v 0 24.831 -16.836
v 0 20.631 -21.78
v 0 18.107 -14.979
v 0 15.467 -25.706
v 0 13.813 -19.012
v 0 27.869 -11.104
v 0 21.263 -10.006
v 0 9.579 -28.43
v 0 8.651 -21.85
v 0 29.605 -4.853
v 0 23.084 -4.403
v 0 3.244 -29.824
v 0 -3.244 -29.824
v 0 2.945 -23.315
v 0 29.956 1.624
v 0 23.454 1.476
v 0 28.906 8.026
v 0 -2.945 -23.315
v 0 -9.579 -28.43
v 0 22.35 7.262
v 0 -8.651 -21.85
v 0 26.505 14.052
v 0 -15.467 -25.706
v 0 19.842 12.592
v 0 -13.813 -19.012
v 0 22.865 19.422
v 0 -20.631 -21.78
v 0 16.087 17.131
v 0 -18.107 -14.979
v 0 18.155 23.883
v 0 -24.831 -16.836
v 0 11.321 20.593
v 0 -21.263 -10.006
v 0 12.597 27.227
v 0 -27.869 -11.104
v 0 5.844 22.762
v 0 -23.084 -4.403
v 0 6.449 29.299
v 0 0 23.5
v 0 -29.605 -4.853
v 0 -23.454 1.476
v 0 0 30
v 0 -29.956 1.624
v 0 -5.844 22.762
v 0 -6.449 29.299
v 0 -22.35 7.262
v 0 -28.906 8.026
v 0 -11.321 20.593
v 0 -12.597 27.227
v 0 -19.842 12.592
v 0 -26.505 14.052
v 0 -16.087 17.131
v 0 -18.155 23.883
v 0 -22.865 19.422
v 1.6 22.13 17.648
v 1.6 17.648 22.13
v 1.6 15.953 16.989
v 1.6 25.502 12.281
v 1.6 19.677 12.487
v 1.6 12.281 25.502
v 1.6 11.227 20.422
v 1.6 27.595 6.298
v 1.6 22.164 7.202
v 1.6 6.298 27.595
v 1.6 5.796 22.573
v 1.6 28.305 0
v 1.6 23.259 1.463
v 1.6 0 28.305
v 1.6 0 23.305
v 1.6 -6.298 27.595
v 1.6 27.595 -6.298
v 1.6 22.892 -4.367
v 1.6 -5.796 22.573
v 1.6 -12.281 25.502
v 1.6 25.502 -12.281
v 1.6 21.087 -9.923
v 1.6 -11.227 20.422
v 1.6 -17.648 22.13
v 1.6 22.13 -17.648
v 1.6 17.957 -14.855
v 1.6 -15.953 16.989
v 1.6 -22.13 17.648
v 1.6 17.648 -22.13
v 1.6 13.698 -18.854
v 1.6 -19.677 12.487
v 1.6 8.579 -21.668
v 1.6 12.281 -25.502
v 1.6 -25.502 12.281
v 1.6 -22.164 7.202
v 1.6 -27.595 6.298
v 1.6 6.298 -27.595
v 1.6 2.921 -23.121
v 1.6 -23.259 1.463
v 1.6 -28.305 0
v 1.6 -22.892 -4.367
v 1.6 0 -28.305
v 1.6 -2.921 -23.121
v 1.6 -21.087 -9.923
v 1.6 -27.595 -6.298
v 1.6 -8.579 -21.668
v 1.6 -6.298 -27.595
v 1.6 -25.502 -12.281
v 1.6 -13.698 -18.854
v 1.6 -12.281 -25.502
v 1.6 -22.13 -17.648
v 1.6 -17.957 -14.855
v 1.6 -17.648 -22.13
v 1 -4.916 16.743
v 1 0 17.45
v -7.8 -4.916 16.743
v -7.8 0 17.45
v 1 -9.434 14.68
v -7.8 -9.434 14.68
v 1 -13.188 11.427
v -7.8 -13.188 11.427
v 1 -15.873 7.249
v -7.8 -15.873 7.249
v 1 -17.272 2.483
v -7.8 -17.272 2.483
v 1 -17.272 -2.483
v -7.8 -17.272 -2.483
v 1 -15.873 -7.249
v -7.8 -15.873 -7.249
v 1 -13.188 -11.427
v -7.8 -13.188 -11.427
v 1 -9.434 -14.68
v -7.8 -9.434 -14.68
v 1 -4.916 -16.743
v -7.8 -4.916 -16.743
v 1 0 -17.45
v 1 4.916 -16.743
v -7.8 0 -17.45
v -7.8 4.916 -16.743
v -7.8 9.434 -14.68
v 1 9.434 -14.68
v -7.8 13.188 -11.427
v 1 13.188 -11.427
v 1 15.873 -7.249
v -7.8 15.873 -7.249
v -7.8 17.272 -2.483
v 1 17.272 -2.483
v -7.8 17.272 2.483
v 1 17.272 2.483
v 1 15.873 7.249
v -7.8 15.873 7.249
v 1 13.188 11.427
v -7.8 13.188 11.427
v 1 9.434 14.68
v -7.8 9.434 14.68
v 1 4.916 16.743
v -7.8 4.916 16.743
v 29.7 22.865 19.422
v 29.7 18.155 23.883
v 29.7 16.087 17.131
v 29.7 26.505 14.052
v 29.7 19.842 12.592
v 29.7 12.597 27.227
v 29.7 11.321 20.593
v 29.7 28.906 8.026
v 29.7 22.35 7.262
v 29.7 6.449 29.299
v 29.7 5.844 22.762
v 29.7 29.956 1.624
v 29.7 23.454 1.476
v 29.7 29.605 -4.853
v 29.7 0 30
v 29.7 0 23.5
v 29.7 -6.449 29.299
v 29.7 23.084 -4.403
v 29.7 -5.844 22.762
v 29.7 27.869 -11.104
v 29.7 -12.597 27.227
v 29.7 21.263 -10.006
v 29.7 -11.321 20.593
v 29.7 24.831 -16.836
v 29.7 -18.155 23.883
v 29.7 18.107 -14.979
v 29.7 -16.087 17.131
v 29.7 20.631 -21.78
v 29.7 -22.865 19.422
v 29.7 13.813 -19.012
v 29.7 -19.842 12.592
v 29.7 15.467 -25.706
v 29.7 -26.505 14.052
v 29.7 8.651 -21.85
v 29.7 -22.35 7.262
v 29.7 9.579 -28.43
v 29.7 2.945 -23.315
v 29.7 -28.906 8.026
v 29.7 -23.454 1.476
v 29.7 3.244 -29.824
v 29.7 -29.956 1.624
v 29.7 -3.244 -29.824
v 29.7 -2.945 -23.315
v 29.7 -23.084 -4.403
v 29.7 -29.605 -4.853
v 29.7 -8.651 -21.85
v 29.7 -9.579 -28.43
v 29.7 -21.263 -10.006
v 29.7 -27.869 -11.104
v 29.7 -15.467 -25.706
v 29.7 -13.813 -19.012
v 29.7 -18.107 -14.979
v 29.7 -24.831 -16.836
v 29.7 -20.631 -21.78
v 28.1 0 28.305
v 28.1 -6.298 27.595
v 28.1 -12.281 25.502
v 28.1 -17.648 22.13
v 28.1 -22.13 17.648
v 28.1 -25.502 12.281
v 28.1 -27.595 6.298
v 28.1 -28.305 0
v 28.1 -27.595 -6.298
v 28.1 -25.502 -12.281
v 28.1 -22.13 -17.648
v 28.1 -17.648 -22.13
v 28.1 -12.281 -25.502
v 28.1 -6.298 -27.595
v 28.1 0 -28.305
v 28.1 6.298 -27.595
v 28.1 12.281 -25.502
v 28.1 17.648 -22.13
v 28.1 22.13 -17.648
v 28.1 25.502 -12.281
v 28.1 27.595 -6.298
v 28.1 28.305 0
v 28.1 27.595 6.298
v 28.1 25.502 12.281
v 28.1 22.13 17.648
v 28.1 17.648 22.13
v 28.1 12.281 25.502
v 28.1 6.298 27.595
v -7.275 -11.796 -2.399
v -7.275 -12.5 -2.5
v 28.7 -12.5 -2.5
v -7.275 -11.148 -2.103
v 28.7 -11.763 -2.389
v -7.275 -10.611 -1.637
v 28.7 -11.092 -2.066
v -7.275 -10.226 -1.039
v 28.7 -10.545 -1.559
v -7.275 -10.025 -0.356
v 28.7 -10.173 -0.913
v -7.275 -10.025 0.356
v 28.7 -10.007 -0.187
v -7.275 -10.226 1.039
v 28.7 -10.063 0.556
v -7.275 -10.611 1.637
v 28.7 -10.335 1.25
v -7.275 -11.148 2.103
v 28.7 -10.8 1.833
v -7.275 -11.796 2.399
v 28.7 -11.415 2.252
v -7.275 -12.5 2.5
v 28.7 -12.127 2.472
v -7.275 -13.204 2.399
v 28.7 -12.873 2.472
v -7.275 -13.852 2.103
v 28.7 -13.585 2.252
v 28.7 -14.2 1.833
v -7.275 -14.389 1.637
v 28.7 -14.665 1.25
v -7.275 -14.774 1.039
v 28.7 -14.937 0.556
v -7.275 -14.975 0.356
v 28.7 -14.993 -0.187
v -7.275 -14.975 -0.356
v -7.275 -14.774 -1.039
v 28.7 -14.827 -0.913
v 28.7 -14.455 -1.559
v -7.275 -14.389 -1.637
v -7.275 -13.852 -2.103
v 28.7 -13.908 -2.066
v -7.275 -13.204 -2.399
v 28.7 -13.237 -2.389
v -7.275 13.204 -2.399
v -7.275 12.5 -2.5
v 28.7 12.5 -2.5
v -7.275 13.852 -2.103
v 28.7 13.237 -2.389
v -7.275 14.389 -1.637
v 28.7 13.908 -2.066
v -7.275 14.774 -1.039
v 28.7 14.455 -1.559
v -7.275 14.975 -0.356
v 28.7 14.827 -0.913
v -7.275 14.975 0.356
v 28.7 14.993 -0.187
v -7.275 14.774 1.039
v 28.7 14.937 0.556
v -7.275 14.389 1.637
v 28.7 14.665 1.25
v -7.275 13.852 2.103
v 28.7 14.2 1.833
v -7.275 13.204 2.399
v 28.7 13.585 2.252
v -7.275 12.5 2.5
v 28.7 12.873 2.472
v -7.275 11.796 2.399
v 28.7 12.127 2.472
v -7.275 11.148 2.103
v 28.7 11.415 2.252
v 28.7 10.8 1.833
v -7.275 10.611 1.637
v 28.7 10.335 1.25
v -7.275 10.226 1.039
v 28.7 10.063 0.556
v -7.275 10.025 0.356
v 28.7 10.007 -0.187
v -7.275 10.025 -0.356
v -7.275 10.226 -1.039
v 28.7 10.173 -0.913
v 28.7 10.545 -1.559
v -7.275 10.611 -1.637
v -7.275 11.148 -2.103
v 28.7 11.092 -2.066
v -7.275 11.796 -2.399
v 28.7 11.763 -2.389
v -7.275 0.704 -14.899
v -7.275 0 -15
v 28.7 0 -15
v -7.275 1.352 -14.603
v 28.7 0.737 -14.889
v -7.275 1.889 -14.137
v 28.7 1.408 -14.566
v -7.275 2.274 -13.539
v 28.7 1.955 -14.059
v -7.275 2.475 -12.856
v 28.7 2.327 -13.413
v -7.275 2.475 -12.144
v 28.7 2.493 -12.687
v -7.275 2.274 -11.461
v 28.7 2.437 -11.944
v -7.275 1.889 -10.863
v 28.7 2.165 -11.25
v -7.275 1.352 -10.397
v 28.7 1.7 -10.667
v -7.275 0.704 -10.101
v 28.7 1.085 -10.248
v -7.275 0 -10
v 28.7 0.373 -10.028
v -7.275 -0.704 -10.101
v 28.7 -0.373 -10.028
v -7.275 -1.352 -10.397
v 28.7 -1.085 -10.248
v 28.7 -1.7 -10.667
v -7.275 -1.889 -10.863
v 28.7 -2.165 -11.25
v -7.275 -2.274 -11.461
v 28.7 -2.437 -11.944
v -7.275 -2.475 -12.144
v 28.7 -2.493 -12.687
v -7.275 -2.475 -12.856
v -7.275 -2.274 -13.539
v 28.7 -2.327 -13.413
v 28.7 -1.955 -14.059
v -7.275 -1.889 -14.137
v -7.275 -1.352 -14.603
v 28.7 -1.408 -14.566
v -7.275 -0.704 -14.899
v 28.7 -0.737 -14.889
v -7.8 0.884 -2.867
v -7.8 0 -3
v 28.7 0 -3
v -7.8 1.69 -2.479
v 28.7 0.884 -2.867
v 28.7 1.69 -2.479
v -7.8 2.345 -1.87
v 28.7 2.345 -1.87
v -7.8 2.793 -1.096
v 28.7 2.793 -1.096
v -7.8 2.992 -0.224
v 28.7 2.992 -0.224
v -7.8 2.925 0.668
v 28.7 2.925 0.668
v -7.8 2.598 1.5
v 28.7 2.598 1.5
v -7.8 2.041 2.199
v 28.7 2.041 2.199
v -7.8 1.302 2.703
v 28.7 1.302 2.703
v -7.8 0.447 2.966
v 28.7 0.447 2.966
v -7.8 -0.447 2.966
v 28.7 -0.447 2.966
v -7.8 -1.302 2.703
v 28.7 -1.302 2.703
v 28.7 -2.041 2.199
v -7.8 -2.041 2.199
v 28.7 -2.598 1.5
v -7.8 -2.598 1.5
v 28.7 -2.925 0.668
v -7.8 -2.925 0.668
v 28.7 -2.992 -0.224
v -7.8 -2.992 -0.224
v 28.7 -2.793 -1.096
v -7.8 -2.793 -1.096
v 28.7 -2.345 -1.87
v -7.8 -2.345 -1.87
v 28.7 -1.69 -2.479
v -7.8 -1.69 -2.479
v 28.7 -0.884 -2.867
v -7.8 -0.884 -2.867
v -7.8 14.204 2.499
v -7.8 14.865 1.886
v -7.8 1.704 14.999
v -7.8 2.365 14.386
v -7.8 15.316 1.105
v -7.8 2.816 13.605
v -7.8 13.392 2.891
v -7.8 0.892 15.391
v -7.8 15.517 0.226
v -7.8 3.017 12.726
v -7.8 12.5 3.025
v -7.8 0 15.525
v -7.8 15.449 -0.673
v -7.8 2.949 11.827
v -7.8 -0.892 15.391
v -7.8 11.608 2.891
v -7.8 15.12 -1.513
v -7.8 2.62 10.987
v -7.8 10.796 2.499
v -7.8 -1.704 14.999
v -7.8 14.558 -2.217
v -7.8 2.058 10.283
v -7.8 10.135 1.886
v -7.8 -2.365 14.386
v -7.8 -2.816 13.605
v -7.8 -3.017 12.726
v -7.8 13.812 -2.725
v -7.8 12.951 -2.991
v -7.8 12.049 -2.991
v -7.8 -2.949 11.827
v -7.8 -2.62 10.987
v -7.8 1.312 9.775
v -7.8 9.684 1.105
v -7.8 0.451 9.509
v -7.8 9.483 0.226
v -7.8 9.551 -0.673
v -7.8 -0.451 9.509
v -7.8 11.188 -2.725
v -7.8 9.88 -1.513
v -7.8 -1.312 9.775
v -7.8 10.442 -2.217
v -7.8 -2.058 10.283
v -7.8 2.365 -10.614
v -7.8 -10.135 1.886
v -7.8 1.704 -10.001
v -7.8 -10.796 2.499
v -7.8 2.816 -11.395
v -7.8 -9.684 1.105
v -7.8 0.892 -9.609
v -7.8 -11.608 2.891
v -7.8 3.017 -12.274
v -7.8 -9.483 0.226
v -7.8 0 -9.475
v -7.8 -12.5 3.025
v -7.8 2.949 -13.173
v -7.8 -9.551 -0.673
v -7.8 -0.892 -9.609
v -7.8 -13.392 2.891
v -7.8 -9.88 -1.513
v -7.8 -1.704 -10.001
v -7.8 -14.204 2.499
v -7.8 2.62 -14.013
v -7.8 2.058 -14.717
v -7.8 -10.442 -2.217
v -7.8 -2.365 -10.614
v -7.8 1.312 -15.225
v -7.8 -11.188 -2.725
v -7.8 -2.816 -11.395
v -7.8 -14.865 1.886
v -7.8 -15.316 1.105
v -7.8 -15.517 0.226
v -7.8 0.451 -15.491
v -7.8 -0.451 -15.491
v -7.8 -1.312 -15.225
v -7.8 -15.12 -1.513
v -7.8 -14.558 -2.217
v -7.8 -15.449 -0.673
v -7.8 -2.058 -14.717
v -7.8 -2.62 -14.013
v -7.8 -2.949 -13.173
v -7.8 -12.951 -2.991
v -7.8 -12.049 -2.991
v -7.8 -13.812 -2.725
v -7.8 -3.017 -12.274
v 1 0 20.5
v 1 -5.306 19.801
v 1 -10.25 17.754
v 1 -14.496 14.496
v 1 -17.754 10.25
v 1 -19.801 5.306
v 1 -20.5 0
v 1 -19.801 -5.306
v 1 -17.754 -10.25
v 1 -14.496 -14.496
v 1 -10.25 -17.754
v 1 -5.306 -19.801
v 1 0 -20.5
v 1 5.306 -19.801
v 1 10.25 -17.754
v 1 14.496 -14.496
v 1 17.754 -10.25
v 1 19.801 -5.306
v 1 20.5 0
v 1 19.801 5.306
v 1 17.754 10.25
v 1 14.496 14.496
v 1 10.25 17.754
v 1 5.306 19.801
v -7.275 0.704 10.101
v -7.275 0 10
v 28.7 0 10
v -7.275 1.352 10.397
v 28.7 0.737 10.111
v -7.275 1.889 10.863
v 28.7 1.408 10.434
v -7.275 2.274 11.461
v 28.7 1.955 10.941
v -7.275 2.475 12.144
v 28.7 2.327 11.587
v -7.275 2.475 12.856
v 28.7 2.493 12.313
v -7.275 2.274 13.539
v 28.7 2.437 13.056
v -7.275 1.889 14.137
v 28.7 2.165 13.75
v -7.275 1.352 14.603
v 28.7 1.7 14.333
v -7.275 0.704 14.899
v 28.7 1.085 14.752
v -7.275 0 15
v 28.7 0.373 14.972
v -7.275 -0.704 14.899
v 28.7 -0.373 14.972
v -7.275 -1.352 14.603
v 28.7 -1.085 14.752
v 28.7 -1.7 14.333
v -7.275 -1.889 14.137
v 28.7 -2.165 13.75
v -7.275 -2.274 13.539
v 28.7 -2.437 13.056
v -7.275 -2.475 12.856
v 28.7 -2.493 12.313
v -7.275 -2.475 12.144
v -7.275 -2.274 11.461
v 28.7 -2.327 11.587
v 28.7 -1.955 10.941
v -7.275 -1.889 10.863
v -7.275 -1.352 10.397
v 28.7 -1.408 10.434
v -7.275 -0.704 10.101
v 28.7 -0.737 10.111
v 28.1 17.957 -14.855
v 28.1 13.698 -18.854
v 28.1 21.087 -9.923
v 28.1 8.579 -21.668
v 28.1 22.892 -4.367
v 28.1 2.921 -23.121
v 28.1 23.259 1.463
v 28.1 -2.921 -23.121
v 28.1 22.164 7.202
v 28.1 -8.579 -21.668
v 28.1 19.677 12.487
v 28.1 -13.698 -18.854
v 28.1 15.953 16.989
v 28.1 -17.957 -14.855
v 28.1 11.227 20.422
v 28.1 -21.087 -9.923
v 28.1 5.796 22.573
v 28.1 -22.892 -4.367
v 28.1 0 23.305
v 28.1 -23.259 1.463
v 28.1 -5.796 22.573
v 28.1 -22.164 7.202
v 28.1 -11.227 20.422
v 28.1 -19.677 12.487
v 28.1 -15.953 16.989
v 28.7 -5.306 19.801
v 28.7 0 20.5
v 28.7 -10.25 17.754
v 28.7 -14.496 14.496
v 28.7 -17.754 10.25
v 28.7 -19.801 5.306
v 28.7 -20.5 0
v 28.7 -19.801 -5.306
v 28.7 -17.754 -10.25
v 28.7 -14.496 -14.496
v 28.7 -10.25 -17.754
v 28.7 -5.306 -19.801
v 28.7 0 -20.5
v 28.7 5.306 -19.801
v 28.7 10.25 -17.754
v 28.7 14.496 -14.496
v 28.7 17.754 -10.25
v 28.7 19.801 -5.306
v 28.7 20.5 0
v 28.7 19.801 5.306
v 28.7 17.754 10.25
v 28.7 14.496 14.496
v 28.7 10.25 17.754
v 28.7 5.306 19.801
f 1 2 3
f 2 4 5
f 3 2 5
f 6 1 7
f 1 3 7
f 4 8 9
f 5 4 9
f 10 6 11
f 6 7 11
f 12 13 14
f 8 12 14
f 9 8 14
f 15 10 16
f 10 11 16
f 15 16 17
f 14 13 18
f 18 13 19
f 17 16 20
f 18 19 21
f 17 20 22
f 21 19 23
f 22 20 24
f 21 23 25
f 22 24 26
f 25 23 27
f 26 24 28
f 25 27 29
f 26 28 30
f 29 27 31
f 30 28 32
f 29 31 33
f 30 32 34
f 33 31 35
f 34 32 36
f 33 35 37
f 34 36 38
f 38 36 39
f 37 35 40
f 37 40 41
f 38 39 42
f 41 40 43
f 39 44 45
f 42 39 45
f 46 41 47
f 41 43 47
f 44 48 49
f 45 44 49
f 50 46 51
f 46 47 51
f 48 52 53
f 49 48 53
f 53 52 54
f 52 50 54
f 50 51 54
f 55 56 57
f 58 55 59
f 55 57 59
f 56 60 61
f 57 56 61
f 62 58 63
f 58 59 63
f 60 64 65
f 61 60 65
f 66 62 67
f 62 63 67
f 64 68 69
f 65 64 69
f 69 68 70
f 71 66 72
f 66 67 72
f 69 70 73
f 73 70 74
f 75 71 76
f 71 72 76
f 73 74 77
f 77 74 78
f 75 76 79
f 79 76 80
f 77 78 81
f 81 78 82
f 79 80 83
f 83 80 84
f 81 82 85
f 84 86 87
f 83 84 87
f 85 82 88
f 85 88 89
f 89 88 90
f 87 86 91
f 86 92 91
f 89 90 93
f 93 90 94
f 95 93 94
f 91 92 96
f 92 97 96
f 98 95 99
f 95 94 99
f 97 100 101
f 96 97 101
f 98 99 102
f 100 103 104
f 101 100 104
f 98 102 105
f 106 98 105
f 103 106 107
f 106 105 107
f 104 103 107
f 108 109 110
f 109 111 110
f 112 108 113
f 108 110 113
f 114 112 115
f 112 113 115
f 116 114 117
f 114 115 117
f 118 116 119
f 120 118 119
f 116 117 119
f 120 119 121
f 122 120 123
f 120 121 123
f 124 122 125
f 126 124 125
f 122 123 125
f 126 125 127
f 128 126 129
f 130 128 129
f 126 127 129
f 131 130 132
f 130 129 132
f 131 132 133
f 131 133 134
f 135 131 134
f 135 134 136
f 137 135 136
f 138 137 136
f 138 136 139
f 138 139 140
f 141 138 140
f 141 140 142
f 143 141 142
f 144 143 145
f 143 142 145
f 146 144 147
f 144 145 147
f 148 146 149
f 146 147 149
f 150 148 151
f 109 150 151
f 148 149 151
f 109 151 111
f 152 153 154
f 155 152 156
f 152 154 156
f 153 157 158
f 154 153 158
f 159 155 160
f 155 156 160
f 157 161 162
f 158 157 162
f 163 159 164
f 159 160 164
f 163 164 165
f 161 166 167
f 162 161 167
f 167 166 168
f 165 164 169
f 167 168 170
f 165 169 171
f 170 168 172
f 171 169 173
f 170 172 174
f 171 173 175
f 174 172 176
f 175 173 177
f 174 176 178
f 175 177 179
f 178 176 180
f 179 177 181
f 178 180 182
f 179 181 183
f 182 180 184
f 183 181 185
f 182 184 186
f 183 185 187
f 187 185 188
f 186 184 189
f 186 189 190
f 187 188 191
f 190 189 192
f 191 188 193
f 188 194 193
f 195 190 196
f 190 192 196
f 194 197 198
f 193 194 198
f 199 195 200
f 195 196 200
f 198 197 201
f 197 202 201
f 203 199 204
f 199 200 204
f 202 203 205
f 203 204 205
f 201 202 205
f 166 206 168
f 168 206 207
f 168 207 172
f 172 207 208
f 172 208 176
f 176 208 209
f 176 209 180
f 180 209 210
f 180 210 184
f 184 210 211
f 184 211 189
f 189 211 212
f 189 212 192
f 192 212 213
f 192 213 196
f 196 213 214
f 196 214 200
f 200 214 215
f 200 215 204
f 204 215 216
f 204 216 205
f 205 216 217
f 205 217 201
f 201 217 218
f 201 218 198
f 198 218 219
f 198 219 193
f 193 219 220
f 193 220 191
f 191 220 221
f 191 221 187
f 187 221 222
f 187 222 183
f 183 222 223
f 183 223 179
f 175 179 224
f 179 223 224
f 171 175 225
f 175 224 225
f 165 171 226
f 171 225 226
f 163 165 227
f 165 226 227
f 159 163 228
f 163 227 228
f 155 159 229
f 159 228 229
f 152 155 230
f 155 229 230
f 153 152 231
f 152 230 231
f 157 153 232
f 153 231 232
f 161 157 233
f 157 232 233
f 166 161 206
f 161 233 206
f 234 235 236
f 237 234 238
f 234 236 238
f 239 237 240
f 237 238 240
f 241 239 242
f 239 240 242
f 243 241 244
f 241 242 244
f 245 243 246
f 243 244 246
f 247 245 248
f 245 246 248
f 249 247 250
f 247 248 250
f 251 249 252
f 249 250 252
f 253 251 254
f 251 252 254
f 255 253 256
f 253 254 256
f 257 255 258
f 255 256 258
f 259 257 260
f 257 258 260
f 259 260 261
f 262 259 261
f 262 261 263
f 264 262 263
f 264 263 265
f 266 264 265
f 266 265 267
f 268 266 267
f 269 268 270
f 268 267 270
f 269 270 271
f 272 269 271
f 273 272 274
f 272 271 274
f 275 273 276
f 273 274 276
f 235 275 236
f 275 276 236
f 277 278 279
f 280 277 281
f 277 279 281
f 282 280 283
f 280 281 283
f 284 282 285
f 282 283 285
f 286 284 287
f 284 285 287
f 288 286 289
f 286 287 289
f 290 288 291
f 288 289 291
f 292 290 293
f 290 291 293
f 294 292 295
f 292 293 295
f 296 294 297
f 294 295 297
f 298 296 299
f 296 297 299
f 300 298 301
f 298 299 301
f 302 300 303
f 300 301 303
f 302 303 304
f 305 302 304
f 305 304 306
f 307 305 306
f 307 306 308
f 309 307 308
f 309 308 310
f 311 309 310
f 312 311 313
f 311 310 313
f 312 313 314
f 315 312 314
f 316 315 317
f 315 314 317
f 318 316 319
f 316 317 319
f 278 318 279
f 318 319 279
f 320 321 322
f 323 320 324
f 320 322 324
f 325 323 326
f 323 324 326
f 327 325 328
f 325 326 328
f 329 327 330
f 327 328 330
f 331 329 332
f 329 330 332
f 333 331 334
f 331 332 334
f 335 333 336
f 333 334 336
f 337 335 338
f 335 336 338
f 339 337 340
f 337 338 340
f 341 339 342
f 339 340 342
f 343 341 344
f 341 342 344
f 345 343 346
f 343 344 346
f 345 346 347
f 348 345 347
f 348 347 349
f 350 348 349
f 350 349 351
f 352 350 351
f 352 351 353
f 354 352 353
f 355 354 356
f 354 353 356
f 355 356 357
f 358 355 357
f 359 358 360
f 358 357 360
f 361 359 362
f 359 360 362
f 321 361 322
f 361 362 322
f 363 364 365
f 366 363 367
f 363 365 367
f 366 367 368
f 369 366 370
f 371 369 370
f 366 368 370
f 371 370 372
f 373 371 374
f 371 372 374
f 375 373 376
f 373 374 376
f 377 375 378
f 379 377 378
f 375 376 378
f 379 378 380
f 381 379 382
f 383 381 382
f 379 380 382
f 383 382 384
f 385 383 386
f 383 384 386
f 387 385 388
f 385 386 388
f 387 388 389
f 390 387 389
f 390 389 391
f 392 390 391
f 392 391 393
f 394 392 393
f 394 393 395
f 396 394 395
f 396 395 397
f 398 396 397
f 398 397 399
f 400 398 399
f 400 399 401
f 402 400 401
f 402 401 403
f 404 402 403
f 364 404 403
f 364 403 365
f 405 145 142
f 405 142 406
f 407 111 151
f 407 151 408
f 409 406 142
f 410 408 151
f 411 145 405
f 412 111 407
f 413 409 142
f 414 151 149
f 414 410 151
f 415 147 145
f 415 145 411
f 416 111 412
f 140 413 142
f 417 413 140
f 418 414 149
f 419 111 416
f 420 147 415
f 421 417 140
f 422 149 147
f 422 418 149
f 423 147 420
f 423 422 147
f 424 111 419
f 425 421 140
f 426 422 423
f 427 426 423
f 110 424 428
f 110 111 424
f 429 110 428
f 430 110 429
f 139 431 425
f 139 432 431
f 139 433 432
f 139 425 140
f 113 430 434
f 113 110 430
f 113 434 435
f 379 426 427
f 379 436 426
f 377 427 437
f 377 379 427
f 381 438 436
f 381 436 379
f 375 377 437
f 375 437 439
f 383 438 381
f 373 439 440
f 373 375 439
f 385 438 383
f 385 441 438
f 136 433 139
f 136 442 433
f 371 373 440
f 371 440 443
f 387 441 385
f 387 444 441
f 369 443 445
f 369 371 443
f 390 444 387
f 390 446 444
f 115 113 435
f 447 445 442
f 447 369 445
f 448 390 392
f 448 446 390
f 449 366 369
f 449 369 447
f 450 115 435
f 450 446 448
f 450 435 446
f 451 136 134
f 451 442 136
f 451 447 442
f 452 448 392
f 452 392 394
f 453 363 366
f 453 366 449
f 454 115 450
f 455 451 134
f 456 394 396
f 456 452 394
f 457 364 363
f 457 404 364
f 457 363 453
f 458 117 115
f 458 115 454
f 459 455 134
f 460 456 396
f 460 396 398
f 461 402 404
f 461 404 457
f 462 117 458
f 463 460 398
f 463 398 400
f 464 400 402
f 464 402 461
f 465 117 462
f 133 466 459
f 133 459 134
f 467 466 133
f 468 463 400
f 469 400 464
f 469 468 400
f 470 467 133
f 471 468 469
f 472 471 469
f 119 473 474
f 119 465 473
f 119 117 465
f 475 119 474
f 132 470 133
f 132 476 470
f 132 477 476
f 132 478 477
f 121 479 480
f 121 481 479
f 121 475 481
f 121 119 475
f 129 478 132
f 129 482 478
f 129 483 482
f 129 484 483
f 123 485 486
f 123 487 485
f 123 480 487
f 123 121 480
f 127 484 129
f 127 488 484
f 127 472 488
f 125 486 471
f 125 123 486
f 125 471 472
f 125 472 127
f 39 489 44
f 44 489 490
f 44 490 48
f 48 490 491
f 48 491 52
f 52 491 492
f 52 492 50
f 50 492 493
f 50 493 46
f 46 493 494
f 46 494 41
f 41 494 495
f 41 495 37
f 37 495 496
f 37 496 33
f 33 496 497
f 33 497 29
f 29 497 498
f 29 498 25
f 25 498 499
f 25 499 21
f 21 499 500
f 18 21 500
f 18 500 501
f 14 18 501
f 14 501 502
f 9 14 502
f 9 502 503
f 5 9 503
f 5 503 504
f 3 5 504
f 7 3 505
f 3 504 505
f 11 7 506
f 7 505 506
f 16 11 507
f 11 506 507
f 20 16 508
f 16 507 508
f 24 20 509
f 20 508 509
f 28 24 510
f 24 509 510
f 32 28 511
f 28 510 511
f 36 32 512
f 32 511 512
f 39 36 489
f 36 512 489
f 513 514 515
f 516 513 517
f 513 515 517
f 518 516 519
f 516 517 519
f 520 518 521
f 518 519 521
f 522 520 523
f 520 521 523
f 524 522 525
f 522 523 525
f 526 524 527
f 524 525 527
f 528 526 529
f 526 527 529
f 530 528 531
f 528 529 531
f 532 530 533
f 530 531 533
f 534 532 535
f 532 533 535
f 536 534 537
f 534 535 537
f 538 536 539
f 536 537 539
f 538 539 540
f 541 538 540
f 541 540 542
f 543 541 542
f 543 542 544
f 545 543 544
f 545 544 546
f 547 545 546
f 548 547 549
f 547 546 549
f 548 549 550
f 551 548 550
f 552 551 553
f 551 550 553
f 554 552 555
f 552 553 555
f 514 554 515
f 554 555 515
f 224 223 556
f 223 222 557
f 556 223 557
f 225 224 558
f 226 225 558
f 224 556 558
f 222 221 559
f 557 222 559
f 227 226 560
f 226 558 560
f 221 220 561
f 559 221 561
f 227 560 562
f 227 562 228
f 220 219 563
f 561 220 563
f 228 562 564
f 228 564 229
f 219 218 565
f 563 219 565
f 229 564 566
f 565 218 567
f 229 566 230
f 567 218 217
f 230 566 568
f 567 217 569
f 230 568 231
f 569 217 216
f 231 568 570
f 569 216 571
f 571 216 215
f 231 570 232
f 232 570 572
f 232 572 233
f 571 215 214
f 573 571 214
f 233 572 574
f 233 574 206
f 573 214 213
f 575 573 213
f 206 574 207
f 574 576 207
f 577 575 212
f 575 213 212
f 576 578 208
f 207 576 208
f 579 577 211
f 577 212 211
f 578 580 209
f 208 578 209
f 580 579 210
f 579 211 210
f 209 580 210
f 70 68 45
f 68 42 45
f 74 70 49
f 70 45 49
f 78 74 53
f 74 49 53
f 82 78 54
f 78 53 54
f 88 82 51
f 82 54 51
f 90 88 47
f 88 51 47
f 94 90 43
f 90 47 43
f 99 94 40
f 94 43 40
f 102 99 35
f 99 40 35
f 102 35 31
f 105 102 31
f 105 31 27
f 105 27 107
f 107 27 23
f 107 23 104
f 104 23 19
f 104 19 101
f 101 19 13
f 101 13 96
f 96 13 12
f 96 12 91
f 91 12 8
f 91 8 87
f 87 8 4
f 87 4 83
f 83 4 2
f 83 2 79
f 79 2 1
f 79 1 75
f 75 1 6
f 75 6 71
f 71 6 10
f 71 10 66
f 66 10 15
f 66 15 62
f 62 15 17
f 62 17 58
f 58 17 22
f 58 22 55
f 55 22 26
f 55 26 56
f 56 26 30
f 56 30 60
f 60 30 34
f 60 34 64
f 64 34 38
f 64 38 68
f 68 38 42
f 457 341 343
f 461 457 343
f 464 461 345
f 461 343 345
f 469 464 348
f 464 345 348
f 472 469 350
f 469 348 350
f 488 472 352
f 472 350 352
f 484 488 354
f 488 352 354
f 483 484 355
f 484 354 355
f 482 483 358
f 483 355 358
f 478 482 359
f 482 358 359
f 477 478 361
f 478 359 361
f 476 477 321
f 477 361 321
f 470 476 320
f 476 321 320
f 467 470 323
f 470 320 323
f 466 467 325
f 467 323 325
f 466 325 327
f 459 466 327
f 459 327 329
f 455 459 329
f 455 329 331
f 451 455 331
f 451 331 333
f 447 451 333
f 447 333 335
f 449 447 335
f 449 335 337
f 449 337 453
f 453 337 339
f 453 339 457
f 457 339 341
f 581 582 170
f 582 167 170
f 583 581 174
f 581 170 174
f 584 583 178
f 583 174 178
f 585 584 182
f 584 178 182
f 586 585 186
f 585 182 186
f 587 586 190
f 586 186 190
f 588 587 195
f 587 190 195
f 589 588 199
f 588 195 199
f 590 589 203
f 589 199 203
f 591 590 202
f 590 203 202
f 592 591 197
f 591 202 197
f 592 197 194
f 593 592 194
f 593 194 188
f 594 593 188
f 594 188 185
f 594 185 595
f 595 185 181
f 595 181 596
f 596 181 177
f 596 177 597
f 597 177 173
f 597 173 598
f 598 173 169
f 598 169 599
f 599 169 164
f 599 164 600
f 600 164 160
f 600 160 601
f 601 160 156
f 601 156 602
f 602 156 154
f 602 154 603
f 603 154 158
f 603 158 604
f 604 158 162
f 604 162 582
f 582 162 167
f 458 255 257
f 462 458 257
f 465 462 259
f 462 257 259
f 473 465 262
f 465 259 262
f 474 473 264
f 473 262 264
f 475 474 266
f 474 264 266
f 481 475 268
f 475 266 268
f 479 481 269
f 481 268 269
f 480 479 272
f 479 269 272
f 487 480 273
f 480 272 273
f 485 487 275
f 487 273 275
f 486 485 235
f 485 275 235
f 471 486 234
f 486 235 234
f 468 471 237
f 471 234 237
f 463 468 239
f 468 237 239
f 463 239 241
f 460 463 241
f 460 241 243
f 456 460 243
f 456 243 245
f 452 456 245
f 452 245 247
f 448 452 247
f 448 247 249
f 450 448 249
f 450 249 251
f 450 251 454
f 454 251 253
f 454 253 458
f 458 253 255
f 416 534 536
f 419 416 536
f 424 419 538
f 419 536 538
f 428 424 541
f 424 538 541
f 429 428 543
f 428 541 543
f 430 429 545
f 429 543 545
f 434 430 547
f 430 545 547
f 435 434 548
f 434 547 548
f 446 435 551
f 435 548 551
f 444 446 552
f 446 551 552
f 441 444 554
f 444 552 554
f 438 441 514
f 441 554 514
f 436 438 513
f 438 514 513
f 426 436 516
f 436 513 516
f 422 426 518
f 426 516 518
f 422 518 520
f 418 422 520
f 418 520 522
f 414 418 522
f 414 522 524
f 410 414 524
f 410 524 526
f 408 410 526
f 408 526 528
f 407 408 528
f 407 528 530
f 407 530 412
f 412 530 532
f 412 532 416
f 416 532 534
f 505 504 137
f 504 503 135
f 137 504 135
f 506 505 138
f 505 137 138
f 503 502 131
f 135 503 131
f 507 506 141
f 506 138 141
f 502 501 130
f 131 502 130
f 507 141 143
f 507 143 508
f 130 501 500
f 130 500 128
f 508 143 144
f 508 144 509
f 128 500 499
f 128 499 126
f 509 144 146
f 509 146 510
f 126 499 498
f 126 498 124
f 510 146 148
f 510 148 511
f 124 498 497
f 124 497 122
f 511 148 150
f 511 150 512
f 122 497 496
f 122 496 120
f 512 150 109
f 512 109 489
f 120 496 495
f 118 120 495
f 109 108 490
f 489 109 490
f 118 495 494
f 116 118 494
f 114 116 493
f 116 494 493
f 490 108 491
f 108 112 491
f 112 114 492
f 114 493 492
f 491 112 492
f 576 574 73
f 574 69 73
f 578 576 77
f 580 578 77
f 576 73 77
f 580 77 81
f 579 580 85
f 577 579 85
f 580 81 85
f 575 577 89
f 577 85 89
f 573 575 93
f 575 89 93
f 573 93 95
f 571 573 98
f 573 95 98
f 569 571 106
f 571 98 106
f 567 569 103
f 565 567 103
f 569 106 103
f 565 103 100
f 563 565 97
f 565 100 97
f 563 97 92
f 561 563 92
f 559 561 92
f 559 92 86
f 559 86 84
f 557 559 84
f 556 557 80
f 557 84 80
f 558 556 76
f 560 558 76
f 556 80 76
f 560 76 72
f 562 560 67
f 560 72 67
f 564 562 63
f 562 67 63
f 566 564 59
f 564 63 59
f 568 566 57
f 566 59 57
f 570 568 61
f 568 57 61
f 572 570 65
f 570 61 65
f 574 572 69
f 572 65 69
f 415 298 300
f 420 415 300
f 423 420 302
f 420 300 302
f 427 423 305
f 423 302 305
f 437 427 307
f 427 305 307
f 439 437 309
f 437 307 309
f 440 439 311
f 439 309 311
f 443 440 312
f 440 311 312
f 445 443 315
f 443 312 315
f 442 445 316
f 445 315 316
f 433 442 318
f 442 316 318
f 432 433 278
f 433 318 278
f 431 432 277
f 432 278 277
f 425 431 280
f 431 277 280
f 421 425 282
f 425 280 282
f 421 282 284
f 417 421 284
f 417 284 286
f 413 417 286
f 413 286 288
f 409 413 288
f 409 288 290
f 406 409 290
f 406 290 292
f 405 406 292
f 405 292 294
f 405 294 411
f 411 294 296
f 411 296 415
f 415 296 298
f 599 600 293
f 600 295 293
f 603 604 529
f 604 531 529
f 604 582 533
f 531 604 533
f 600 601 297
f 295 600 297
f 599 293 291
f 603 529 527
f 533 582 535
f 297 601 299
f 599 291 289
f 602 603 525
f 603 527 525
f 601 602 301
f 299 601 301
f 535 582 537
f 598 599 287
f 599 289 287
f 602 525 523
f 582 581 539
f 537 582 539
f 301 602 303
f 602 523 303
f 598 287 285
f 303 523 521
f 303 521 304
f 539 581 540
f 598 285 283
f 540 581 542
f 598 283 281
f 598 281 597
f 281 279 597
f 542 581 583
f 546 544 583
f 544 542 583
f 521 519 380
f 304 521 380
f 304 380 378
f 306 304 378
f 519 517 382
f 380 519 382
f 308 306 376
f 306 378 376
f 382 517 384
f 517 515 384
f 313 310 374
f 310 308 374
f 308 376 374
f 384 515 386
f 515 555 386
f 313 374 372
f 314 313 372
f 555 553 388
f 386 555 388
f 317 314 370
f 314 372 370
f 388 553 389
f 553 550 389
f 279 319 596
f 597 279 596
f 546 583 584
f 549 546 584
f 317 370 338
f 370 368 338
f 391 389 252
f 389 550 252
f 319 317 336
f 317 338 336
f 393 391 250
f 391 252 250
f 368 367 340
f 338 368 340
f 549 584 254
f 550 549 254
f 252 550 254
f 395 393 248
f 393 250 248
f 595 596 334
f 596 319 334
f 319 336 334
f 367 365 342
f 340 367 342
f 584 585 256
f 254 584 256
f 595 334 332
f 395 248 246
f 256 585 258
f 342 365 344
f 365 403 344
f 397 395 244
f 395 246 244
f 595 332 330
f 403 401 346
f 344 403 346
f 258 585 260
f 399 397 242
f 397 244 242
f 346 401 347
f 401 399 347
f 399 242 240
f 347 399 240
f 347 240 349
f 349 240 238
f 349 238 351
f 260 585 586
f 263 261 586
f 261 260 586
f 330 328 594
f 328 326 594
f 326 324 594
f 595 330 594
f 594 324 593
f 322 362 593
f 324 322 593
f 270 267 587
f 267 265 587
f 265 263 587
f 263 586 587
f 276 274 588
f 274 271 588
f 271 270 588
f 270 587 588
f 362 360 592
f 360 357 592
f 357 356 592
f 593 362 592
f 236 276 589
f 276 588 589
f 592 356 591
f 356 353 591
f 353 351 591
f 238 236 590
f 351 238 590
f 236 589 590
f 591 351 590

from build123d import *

# Parameters (mm, degrees)
SKETCH1_W                   = 7.8
SKETCH1_H                   = 17.45
SKETCH2_R                   = 2.5
CUT_EXTRUDE1_DEPTH          = 57.623758265
M6_TAPPED_HOLE2_D           = 5
M6_TAPPED_HOLE2_DEPTH       = 55
M6_TAPPED_HOLE2_CSINK_D     = 6.05
M6_TAPPED_HOLE2_CSINK_ANGLE = 90
M6_TAPPED_HOLE2_TIP         = 1.502151548
SKETCH5_R                   = 3
CUT_EXTRUDE2_DEPTH          = 56.966507842


with BuildPart() as part:
    # Sketch1 → Revolve1 (revolve)
    with BuildSketch(Plane.XY, mode=Mode.PRIVATE) as revolve1_sk:
        Polygon((28.1, 23.305), (1.6, 23.305), (0.065, 23.305), (1, 20.5), (1, 17.45), (0, 17.45), (0, 0), (28.7, 0), (28.7, 20.5), (29.7, 23.5), (29.7, 30), (28.1, 28.305), align=None)
        Polygon((0.065, 23.305), (1.6, 23.305), (1.6, 28.305), (0, 30), (0, 23.5), align=None)
        with Locations((-3.9, 8.725)):
            Rectangle(SKETCH1_W, SKETCH1_H)
    revolve(revolve1_sk.sketch.rotate(Axis((0, 0, 0), (1, 0, 0)), 90), axis=Axis((0, 0, 0), (1, 0, 0)))

    # Sketch2 → Cut-Extrude1 (cut, through all)
    with BuildSketch(Plane(origin=(29.7, 0, 0), x_dir=(0, 0, -1), z_dir=(1, 0, 0))):
        with Locations((12.5, 0)):
            Circle(SKETCH2_R)
        with Locations((0, -12.5)):
            Circle(SKETCH2_R)
        with Locations((-12.5, 0)):
            Circle(SKETCH2_R)
        with Locations((0, 12.5)):
            Circle(SKETCH2_R)
    extrude(amount=-CUT_EXTRUDE1_DEPTH, mode=Mode.SUBTRACT)

    # M6 Tapped Hole2
    with Locations(Plane(origin=(-7.8, 0, -12.5), x_dir=(0, 0, -1), z_dir=(-1, 0, 0))):
        with Locations((0, 0), (-12.5, -12.5), (-25, 0), (-12.5, 12.5)):
            CounterSinkHole(M6_TAPPED_HOLE2_D / 2, M6_TAPPED_HOLE2_CSINK_D / 2, depth=M6_TAPPED_HOLE2_DEPTH, counter_sink_angle=M6_TAPPED_HOLE2_CSINK_ANGLE)
            with Locations((0, 0, -(M6_TAPPED_HOLE2_DEPTH + M6_TAPPED_HOLE2_TIP / 2))):  # 118° drill point
                Cone(0, M6_TAPPED_HOLE2_D / 2, M6_TAPPED_HOLE2_TIP, mode=Mode.SUBTRACT)

    # Sketch5 → Cut-Extrude2 (cut, through all)
    with BuildSketch(Plane(origin=(28.7, 0, 0), x_dir=(0, 0, -1), z_dir=(1, 0, 0))):
        Circle(SKETCH5_R)
    extrude(amount=-CUT_EXTRUDE2_DEPTH, mode=Mode.SUBTRACT)


solid = part.part
